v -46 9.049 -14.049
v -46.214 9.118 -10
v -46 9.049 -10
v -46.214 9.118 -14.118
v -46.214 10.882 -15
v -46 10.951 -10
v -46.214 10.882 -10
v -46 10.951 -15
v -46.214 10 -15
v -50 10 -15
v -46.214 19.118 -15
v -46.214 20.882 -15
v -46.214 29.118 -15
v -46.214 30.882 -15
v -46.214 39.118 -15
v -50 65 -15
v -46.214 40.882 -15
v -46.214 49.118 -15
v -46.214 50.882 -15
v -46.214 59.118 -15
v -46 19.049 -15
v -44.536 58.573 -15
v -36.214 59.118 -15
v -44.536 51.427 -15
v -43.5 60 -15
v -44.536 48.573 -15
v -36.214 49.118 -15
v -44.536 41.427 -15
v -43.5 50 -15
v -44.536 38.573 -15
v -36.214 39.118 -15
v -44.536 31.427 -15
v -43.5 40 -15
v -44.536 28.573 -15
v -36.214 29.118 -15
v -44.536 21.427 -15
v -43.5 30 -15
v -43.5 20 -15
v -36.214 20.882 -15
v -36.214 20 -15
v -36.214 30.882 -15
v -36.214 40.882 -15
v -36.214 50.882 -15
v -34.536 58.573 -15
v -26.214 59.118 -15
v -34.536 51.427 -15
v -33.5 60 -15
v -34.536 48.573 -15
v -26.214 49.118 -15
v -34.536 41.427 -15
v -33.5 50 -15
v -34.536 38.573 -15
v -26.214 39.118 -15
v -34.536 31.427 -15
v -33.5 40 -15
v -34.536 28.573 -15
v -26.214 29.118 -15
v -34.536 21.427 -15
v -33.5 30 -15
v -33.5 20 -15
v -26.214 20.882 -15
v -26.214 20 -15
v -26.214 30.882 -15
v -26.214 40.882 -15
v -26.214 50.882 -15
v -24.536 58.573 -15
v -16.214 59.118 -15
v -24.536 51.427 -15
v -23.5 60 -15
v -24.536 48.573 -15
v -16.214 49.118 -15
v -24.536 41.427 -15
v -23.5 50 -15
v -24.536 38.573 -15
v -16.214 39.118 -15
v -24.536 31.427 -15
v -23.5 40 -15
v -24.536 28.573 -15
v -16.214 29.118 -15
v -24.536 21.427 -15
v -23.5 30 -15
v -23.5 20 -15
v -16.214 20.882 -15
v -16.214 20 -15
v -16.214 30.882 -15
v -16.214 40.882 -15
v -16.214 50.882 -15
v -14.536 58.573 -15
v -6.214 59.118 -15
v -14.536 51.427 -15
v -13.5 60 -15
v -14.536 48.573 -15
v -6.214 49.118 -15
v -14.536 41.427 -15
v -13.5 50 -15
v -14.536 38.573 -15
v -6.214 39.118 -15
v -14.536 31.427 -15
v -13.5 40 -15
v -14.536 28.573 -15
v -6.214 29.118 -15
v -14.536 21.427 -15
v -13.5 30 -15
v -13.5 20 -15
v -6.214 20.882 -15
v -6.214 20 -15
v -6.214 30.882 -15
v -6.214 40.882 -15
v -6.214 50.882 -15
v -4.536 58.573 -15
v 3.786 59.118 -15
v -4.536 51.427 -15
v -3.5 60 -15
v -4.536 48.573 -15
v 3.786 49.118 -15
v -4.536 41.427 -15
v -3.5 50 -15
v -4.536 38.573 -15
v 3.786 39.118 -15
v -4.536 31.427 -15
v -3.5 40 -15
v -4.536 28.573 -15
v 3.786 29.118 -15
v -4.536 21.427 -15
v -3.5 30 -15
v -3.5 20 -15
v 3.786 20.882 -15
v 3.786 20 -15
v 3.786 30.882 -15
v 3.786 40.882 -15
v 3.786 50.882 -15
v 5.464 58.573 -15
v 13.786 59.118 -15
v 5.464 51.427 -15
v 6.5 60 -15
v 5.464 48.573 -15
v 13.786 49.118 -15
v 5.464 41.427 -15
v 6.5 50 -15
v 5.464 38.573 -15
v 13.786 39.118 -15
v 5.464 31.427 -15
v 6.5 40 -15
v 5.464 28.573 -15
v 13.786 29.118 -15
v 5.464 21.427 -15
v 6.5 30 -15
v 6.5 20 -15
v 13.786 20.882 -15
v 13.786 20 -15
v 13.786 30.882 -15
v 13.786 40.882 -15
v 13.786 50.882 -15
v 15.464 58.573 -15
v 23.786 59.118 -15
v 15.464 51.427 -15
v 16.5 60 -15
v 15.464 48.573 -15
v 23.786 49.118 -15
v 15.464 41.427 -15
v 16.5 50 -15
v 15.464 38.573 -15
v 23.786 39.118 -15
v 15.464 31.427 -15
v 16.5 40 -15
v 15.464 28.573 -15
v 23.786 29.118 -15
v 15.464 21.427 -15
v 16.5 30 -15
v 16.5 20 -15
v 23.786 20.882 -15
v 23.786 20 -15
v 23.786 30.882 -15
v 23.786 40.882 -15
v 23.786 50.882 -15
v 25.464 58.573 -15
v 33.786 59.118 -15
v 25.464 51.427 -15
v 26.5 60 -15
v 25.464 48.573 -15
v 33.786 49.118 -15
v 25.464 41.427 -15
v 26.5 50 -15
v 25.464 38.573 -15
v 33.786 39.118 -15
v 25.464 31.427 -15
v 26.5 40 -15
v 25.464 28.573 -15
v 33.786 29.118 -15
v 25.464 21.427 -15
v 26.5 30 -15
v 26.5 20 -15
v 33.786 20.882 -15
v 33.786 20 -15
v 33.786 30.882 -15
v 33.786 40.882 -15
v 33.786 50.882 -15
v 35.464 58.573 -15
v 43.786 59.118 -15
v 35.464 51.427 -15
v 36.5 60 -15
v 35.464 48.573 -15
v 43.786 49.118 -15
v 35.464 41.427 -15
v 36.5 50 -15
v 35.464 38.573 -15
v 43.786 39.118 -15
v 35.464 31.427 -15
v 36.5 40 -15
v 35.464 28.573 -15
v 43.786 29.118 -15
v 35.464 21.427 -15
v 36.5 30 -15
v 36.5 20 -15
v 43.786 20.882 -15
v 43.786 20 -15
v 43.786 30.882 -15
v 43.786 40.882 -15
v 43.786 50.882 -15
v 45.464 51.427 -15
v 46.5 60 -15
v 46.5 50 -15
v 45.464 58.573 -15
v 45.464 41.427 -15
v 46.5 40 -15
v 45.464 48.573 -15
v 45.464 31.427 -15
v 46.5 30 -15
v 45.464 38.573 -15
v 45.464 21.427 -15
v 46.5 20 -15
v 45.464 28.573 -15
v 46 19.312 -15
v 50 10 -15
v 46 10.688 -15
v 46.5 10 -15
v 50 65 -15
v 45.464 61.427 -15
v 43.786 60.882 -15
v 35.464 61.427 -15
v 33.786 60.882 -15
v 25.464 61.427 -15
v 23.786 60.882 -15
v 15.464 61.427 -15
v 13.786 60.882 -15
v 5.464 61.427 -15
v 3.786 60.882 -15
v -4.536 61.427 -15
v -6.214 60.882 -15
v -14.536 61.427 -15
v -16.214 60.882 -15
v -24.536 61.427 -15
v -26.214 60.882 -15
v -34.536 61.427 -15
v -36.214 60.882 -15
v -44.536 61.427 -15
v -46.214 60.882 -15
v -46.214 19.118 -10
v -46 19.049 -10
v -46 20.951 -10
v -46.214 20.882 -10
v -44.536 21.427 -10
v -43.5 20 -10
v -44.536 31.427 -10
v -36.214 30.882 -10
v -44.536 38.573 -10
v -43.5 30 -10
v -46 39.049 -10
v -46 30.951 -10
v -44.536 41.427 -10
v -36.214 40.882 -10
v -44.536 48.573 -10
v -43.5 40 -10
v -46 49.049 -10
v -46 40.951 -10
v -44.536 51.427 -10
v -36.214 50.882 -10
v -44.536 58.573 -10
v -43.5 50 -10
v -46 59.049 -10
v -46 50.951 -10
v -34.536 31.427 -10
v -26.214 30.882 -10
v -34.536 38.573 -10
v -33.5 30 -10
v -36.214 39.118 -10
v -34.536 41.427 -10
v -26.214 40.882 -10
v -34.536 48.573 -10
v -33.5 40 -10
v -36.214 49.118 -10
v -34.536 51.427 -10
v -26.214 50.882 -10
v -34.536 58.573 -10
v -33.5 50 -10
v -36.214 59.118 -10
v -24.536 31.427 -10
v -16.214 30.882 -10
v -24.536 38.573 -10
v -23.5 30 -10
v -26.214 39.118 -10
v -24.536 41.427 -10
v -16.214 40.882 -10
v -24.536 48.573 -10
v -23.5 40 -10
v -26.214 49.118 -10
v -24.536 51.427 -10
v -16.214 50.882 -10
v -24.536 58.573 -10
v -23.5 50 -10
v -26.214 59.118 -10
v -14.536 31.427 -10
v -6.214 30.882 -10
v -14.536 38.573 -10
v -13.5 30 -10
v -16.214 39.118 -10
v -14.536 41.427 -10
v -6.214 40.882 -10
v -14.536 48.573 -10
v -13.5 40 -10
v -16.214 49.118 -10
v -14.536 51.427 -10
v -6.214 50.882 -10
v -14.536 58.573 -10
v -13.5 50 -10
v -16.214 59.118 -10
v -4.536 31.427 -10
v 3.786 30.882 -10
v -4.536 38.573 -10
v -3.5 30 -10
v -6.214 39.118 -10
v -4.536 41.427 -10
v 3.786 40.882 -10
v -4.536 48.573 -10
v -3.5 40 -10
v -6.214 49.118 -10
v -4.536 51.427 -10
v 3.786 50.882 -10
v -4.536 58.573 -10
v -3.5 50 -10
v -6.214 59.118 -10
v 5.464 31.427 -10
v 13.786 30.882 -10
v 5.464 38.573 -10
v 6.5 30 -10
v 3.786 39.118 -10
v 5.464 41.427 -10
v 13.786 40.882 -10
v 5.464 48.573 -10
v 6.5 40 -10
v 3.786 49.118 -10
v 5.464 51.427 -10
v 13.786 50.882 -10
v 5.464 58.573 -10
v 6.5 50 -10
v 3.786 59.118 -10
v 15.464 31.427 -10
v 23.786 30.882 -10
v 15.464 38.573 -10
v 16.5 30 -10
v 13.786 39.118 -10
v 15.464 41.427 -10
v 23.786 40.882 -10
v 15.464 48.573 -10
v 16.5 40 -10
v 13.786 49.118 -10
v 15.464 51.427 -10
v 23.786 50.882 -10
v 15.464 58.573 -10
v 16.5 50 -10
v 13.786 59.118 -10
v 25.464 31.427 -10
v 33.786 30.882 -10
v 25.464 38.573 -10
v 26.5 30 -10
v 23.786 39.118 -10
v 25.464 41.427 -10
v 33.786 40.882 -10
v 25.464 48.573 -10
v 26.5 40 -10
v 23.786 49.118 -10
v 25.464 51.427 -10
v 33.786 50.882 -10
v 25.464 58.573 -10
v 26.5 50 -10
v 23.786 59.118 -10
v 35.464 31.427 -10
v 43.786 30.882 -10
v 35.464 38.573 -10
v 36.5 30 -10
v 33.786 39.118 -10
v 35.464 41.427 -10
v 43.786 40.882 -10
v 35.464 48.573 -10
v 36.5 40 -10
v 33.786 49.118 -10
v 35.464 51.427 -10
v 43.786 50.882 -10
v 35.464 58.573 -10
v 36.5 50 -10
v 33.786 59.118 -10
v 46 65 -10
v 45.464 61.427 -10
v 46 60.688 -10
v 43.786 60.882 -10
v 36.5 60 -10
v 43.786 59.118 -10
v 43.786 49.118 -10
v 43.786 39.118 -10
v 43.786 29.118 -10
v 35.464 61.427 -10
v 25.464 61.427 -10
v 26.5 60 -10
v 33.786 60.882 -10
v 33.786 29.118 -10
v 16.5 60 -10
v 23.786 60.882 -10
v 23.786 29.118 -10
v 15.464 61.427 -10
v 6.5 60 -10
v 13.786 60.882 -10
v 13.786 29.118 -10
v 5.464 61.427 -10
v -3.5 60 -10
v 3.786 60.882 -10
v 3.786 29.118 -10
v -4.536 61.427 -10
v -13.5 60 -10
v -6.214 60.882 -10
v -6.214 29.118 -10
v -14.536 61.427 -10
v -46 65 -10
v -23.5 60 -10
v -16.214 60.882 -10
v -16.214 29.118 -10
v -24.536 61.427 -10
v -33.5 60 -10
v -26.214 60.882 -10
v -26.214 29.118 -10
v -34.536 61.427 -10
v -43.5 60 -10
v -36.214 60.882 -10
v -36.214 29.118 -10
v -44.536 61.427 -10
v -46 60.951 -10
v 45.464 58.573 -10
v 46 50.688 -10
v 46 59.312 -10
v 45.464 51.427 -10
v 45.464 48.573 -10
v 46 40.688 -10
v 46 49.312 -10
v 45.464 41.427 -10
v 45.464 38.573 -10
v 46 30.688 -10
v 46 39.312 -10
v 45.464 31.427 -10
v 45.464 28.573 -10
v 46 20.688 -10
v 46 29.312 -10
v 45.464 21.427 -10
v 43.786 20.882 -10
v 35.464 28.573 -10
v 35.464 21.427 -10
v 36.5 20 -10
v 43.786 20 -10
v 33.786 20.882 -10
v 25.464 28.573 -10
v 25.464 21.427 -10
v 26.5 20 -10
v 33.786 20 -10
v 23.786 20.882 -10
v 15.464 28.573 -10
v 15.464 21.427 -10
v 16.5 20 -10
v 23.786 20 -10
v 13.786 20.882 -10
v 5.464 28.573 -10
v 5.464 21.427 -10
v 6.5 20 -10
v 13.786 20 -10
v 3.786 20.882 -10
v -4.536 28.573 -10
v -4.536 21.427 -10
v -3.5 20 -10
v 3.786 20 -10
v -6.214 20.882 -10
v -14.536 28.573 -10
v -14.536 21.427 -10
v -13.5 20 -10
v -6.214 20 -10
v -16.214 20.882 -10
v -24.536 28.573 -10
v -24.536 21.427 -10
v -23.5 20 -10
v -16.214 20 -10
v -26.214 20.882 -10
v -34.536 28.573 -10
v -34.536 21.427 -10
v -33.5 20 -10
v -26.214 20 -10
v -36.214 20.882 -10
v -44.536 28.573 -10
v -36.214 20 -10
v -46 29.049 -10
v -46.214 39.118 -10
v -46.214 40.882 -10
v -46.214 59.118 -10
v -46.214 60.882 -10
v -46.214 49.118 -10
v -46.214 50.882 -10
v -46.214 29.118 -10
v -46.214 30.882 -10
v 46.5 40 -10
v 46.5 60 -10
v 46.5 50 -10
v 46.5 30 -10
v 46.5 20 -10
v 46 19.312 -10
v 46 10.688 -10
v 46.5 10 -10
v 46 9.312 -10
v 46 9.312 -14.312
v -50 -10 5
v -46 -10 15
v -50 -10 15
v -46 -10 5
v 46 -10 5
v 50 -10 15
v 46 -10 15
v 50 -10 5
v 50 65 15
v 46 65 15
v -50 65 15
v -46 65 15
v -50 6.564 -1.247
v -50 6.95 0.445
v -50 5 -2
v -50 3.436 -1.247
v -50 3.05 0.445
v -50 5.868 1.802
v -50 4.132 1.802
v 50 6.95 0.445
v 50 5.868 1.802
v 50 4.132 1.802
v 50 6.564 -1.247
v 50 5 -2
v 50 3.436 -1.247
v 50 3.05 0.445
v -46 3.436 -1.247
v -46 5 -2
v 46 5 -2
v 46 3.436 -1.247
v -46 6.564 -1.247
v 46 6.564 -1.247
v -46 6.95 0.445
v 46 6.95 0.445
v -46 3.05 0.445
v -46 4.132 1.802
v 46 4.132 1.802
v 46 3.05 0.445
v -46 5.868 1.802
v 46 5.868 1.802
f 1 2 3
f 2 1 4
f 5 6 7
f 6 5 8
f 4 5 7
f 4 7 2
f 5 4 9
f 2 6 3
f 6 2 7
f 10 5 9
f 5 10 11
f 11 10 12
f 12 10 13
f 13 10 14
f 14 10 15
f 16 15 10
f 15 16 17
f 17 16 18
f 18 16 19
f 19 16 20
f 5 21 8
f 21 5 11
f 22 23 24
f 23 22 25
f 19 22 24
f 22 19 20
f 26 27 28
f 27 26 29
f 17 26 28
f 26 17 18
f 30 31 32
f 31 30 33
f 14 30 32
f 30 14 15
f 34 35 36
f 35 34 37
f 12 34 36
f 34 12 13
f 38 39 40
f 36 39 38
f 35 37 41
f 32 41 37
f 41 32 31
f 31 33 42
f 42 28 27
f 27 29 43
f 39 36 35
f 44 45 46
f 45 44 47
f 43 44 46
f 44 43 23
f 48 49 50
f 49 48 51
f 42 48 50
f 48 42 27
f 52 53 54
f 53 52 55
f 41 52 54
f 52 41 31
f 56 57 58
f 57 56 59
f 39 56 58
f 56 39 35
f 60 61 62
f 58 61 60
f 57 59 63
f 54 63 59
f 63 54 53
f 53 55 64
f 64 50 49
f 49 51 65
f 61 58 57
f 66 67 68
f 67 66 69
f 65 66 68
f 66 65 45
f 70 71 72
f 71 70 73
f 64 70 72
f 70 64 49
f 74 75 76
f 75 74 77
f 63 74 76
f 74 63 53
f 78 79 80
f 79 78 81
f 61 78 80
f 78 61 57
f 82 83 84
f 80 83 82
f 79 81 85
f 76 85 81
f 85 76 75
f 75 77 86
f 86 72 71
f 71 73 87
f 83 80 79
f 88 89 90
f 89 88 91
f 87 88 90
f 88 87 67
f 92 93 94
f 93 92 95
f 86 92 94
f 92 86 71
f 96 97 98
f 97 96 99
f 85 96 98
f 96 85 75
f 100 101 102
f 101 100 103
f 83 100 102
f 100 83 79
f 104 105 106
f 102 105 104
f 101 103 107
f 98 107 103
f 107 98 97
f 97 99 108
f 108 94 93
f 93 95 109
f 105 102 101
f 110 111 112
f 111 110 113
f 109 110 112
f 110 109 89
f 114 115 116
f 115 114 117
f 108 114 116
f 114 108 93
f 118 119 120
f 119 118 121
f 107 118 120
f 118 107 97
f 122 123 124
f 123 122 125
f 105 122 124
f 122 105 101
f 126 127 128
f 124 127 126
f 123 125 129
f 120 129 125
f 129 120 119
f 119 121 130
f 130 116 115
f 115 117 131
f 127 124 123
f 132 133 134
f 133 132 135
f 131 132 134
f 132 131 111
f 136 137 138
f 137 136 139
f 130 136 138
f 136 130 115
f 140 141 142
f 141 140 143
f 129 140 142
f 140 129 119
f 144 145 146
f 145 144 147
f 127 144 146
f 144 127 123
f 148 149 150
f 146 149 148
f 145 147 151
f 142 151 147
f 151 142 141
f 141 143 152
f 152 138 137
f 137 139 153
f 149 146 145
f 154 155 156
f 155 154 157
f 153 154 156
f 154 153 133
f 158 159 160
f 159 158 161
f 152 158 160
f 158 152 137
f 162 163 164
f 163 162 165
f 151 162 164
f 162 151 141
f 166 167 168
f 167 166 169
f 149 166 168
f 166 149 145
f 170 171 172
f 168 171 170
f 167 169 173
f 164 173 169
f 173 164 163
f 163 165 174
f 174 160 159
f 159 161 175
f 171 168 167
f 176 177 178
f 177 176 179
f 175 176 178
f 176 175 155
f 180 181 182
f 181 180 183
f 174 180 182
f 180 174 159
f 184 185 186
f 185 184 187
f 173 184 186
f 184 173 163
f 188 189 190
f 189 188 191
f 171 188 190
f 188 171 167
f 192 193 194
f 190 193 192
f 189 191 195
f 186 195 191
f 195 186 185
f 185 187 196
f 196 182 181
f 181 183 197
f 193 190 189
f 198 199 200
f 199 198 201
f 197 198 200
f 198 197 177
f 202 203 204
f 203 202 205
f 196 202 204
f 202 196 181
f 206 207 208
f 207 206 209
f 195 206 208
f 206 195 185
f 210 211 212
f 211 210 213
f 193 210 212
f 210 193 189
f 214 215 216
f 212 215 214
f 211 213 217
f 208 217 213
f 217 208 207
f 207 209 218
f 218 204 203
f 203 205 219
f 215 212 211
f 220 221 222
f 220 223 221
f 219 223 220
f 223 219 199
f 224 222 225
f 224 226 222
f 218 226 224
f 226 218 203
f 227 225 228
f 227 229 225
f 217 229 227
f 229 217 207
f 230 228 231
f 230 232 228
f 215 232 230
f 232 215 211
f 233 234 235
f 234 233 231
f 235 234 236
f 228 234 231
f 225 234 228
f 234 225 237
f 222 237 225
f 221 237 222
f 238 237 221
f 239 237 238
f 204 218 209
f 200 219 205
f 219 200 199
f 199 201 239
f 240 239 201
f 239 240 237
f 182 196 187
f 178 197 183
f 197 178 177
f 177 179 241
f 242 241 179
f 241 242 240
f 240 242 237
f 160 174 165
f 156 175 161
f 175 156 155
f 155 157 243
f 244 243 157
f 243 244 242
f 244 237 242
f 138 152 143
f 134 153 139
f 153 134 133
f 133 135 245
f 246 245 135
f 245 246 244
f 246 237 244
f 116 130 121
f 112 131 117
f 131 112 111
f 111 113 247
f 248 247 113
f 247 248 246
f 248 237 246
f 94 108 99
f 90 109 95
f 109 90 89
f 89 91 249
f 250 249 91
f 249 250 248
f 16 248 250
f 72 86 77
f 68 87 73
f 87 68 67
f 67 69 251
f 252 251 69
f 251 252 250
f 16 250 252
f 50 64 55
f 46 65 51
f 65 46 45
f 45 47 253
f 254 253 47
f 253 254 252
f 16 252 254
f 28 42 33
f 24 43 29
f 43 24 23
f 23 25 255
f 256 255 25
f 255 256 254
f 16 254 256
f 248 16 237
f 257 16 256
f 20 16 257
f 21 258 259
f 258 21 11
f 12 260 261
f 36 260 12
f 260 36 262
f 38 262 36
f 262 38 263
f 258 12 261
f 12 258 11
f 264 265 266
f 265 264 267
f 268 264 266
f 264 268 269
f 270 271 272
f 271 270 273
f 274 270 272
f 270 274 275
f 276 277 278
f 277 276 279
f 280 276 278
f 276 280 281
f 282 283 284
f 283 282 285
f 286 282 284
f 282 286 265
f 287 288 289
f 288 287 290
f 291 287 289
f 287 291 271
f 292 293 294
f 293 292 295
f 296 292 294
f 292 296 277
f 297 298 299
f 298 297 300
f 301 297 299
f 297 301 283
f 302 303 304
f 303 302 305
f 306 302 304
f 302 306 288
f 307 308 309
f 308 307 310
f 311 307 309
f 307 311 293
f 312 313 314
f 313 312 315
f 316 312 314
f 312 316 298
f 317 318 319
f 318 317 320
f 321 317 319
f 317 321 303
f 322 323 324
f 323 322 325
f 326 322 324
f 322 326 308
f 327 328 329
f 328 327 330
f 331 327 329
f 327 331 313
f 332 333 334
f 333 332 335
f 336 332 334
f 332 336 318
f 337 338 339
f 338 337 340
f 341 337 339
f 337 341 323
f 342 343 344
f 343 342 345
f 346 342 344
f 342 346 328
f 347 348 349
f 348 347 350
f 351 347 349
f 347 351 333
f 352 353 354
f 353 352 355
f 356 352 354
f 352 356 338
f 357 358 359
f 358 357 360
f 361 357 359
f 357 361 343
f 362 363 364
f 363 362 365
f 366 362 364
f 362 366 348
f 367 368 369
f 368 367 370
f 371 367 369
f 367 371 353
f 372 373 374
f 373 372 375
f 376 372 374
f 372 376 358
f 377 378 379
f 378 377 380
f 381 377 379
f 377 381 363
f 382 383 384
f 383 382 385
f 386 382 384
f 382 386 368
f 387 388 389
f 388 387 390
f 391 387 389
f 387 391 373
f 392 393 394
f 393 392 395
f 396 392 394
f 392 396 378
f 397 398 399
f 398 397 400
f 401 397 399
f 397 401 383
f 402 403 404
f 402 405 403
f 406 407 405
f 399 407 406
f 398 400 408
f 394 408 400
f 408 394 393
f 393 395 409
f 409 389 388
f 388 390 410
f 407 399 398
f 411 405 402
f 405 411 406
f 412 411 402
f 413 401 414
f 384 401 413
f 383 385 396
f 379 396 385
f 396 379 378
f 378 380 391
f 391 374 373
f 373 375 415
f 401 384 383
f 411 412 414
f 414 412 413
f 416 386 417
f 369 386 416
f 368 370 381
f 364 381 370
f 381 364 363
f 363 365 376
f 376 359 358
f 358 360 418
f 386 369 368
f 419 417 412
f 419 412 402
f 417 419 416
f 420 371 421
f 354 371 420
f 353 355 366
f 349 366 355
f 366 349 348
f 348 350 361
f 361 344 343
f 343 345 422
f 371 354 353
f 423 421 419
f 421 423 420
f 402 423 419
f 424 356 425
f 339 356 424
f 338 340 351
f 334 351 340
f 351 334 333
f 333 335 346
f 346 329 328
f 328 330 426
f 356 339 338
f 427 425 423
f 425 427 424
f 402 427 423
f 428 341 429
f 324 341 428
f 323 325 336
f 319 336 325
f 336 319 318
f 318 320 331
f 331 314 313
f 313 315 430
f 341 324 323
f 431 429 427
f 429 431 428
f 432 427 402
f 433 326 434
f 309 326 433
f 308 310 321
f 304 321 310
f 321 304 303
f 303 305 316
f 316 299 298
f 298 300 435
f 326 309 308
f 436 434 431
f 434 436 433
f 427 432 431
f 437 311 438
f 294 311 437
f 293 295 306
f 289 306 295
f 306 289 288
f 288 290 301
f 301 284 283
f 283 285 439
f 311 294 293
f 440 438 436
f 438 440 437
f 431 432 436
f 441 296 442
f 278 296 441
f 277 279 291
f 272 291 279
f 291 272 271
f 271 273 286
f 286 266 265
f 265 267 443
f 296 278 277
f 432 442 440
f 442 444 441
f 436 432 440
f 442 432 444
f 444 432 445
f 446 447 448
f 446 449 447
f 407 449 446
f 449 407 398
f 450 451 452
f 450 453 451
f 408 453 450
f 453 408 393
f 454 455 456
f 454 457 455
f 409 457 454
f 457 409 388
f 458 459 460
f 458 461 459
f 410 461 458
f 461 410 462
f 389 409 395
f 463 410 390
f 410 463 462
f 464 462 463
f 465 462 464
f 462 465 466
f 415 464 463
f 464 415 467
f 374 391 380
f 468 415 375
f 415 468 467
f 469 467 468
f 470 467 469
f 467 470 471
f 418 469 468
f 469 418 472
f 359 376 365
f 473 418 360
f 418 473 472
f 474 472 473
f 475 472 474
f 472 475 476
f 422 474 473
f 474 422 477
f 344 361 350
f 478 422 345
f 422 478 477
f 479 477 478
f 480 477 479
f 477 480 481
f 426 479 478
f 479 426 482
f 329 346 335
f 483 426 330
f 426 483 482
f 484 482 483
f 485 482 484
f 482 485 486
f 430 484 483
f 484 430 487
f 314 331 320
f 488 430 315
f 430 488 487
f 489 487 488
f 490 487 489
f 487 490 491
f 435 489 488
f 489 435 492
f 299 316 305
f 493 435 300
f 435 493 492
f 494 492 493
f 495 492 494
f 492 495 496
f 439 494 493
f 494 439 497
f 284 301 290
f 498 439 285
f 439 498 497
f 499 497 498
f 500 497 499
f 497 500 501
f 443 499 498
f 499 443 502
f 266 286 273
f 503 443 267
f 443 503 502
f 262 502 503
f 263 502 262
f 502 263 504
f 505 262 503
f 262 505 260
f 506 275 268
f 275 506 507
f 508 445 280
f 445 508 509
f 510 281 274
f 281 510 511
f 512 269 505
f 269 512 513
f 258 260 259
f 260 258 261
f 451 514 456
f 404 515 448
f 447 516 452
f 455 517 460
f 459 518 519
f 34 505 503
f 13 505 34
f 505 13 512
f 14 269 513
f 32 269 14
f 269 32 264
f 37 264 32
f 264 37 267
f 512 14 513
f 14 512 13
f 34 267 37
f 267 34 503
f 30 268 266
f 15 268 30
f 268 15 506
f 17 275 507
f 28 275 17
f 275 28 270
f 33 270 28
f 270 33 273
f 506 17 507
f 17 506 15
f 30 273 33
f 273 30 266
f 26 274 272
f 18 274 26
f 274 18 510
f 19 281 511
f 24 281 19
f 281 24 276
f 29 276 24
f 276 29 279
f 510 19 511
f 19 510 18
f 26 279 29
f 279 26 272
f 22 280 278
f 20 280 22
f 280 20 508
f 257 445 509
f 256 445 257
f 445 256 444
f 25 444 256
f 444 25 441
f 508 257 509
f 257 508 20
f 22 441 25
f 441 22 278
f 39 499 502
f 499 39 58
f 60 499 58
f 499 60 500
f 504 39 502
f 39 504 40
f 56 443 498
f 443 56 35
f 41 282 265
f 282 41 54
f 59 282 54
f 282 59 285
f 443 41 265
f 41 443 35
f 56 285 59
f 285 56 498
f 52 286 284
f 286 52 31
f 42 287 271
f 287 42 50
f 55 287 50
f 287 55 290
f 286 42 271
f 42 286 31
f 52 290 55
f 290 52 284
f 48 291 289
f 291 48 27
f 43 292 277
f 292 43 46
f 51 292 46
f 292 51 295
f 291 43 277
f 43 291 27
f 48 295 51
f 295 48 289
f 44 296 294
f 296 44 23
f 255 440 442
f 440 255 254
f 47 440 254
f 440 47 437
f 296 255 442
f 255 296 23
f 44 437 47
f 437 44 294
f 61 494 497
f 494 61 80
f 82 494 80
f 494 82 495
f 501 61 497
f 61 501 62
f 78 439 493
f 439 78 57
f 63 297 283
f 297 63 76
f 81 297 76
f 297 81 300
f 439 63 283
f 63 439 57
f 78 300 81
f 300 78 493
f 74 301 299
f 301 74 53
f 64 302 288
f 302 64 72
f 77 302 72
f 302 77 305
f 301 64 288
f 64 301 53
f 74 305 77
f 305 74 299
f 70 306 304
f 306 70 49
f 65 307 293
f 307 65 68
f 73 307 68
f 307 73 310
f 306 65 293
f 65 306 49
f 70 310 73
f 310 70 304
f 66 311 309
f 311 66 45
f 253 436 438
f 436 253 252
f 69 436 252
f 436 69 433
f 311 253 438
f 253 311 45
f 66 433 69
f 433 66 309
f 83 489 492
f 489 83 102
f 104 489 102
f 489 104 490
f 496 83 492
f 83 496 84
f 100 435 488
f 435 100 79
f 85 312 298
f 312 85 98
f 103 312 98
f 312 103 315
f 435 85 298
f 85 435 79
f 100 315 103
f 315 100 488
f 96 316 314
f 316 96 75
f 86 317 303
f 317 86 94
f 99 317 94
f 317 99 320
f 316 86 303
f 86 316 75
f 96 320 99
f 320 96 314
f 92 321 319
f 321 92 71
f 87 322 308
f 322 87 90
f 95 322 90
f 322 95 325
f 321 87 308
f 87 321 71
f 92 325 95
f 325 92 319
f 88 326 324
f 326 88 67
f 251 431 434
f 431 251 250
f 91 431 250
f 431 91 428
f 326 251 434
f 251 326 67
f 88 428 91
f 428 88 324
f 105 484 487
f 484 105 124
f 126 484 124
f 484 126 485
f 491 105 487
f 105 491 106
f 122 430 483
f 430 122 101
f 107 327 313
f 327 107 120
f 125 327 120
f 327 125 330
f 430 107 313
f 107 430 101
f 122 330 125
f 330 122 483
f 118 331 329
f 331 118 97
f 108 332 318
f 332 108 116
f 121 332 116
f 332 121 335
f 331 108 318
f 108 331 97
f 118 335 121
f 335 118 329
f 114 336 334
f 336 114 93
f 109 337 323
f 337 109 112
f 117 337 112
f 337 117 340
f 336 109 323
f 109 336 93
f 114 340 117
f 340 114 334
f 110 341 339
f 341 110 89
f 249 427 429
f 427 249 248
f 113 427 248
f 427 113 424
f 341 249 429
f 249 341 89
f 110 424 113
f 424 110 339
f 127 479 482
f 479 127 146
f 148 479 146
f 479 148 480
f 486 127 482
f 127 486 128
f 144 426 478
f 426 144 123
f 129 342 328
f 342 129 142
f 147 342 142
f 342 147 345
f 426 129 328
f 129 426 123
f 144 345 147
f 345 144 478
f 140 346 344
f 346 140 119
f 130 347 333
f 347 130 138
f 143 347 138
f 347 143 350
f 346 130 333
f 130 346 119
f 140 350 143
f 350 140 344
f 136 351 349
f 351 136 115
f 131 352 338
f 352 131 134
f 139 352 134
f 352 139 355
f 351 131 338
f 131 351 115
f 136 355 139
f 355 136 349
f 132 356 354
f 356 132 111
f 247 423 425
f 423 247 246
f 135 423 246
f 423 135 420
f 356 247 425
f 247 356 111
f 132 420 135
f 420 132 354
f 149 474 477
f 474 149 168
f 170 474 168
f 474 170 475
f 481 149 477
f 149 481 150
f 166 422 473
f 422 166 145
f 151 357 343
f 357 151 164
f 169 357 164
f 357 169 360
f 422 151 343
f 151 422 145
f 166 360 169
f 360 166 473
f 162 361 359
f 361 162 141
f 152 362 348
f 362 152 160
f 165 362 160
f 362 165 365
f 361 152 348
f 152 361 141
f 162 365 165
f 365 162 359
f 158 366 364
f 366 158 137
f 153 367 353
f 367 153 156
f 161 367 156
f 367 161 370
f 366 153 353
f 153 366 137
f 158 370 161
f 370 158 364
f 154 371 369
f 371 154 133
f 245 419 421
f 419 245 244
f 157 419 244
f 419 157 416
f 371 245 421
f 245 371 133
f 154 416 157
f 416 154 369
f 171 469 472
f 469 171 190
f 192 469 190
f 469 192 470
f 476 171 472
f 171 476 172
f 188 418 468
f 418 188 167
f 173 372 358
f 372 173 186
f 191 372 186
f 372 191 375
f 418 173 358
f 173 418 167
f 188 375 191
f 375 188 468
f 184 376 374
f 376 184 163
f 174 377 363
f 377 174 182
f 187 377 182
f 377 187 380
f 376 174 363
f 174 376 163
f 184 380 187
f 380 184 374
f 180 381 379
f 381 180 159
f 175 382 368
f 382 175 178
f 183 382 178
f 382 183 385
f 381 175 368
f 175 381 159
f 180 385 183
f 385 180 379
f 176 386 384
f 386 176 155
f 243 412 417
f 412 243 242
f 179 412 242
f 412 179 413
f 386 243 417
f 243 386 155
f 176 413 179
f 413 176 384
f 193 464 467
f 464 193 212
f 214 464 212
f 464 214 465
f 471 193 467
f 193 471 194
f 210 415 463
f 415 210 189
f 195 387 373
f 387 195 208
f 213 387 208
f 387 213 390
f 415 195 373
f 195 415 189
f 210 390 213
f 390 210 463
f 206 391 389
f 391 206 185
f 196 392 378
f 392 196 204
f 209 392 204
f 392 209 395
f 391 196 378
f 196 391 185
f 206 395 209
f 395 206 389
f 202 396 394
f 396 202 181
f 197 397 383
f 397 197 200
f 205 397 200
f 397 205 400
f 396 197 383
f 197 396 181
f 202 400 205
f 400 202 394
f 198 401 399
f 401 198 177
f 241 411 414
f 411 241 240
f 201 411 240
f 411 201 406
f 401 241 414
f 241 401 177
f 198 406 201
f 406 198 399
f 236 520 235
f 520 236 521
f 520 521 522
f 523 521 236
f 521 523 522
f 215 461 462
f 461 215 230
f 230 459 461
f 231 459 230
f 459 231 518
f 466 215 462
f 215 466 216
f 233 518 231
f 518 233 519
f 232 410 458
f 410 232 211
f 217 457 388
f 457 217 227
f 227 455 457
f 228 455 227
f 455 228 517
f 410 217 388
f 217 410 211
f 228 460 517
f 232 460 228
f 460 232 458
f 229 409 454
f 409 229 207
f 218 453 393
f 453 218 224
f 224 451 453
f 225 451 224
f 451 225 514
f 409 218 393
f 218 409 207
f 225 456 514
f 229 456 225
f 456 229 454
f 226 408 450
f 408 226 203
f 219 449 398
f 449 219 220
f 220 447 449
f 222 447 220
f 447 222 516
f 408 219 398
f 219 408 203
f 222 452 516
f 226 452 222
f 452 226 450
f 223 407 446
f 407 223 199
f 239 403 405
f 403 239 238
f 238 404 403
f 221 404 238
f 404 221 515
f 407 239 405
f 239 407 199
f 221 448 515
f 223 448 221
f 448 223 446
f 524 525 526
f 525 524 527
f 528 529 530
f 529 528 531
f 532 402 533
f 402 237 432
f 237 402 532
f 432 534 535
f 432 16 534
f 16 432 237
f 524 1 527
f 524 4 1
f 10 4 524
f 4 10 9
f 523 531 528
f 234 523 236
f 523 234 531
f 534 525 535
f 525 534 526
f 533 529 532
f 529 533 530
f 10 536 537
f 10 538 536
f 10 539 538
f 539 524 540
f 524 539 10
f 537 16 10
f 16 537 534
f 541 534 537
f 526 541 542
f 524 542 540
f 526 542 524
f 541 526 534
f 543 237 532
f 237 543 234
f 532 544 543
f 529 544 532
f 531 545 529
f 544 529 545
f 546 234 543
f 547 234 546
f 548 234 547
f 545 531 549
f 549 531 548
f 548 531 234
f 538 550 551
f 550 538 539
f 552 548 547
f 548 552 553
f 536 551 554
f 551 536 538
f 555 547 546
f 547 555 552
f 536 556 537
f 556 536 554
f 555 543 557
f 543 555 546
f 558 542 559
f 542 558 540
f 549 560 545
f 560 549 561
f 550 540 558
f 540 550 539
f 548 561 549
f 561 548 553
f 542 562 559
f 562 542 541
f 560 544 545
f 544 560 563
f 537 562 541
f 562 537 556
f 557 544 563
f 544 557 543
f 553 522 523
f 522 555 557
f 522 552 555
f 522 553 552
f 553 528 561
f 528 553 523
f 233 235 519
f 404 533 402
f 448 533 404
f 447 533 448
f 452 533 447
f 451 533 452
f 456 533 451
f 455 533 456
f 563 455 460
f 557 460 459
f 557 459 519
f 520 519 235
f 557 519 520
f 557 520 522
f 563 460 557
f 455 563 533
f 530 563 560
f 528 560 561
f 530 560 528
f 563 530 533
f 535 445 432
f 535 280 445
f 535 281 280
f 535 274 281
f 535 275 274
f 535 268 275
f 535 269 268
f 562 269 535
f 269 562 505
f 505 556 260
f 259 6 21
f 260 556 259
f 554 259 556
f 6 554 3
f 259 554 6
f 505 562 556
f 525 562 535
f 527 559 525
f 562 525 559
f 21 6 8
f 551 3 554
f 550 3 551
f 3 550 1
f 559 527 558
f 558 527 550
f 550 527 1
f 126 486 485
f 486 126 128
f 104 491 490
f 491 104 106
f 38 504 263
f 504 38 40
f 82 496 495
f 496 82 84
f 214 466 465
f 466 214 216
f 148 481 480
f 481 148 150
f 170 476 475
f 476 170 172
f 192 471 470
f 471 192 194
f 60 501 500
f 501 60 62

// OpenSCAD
module base() {
	difference() {
		cube([100 - 10, 75, 30]);

		translate([5, 5, 5])
			cube([100 - 10 - 10, 75 - 5 + 0.1, 30 - 5 + 0.1]);
		translate([0, 5, 25])
			cube([100 - 10 + 0.1, 75 - 5 + 0.1, 5 + 0.1]);


		// Hinge hole
		translate([0, 15, 15])
			rotate([0, 90, 0])
				cylinder(d = 3, h = 100 - 10);

		// Mount holes
		for(x = [5:10:85])
			for(z = [5:10:25])
				translate([x, 0, z])
					rotate([-90, 0, 0])
						cylinder(d = 3, h = 15);

		// Mount holes
		for(x = [5:10:85])
			for(y = [10:10:90])
				translate([x, y, 0])
					cylinder(d = 3, h = 5);
	}
}

module attachment() {
	difference() {
		hull() {
			translate([0, 20, 0])
				cube([100, 75-20, 10]);
			translate([0, 0, 20])
				cube([100, 75, 10]);
		}

		// Hinge hole
		translate([0, 15, 15])
			rotate([0, 90, 0])
				cylinder(d = 4, h = 120 - 10);

		translate([5 - 1, 0, 5])
			cube([100 - 10 + 2, 75, 30 - 5]);
		#translate([5 - 1, 0, 0])
			cube([100 - 10 + 2, 30, 30]);
		translate([5 - 1, 0, 0])
			cube([100 - 10 + 2, 10, 20 - 5]);

		// Mount holes
		for(x = [5:10:95])
			for(y = [10:10:90])
				translate([x, y, 0])
					cylinder(d = 3, h = 5);
	}
}


//rotate([0, 180, 0])
//	translate([-90/2, -10, -30/2])
//		base();


rotate([-$t*15, 0, 0])
	render()
		translate([-100/2, -10, -30/2])
			attachment();
